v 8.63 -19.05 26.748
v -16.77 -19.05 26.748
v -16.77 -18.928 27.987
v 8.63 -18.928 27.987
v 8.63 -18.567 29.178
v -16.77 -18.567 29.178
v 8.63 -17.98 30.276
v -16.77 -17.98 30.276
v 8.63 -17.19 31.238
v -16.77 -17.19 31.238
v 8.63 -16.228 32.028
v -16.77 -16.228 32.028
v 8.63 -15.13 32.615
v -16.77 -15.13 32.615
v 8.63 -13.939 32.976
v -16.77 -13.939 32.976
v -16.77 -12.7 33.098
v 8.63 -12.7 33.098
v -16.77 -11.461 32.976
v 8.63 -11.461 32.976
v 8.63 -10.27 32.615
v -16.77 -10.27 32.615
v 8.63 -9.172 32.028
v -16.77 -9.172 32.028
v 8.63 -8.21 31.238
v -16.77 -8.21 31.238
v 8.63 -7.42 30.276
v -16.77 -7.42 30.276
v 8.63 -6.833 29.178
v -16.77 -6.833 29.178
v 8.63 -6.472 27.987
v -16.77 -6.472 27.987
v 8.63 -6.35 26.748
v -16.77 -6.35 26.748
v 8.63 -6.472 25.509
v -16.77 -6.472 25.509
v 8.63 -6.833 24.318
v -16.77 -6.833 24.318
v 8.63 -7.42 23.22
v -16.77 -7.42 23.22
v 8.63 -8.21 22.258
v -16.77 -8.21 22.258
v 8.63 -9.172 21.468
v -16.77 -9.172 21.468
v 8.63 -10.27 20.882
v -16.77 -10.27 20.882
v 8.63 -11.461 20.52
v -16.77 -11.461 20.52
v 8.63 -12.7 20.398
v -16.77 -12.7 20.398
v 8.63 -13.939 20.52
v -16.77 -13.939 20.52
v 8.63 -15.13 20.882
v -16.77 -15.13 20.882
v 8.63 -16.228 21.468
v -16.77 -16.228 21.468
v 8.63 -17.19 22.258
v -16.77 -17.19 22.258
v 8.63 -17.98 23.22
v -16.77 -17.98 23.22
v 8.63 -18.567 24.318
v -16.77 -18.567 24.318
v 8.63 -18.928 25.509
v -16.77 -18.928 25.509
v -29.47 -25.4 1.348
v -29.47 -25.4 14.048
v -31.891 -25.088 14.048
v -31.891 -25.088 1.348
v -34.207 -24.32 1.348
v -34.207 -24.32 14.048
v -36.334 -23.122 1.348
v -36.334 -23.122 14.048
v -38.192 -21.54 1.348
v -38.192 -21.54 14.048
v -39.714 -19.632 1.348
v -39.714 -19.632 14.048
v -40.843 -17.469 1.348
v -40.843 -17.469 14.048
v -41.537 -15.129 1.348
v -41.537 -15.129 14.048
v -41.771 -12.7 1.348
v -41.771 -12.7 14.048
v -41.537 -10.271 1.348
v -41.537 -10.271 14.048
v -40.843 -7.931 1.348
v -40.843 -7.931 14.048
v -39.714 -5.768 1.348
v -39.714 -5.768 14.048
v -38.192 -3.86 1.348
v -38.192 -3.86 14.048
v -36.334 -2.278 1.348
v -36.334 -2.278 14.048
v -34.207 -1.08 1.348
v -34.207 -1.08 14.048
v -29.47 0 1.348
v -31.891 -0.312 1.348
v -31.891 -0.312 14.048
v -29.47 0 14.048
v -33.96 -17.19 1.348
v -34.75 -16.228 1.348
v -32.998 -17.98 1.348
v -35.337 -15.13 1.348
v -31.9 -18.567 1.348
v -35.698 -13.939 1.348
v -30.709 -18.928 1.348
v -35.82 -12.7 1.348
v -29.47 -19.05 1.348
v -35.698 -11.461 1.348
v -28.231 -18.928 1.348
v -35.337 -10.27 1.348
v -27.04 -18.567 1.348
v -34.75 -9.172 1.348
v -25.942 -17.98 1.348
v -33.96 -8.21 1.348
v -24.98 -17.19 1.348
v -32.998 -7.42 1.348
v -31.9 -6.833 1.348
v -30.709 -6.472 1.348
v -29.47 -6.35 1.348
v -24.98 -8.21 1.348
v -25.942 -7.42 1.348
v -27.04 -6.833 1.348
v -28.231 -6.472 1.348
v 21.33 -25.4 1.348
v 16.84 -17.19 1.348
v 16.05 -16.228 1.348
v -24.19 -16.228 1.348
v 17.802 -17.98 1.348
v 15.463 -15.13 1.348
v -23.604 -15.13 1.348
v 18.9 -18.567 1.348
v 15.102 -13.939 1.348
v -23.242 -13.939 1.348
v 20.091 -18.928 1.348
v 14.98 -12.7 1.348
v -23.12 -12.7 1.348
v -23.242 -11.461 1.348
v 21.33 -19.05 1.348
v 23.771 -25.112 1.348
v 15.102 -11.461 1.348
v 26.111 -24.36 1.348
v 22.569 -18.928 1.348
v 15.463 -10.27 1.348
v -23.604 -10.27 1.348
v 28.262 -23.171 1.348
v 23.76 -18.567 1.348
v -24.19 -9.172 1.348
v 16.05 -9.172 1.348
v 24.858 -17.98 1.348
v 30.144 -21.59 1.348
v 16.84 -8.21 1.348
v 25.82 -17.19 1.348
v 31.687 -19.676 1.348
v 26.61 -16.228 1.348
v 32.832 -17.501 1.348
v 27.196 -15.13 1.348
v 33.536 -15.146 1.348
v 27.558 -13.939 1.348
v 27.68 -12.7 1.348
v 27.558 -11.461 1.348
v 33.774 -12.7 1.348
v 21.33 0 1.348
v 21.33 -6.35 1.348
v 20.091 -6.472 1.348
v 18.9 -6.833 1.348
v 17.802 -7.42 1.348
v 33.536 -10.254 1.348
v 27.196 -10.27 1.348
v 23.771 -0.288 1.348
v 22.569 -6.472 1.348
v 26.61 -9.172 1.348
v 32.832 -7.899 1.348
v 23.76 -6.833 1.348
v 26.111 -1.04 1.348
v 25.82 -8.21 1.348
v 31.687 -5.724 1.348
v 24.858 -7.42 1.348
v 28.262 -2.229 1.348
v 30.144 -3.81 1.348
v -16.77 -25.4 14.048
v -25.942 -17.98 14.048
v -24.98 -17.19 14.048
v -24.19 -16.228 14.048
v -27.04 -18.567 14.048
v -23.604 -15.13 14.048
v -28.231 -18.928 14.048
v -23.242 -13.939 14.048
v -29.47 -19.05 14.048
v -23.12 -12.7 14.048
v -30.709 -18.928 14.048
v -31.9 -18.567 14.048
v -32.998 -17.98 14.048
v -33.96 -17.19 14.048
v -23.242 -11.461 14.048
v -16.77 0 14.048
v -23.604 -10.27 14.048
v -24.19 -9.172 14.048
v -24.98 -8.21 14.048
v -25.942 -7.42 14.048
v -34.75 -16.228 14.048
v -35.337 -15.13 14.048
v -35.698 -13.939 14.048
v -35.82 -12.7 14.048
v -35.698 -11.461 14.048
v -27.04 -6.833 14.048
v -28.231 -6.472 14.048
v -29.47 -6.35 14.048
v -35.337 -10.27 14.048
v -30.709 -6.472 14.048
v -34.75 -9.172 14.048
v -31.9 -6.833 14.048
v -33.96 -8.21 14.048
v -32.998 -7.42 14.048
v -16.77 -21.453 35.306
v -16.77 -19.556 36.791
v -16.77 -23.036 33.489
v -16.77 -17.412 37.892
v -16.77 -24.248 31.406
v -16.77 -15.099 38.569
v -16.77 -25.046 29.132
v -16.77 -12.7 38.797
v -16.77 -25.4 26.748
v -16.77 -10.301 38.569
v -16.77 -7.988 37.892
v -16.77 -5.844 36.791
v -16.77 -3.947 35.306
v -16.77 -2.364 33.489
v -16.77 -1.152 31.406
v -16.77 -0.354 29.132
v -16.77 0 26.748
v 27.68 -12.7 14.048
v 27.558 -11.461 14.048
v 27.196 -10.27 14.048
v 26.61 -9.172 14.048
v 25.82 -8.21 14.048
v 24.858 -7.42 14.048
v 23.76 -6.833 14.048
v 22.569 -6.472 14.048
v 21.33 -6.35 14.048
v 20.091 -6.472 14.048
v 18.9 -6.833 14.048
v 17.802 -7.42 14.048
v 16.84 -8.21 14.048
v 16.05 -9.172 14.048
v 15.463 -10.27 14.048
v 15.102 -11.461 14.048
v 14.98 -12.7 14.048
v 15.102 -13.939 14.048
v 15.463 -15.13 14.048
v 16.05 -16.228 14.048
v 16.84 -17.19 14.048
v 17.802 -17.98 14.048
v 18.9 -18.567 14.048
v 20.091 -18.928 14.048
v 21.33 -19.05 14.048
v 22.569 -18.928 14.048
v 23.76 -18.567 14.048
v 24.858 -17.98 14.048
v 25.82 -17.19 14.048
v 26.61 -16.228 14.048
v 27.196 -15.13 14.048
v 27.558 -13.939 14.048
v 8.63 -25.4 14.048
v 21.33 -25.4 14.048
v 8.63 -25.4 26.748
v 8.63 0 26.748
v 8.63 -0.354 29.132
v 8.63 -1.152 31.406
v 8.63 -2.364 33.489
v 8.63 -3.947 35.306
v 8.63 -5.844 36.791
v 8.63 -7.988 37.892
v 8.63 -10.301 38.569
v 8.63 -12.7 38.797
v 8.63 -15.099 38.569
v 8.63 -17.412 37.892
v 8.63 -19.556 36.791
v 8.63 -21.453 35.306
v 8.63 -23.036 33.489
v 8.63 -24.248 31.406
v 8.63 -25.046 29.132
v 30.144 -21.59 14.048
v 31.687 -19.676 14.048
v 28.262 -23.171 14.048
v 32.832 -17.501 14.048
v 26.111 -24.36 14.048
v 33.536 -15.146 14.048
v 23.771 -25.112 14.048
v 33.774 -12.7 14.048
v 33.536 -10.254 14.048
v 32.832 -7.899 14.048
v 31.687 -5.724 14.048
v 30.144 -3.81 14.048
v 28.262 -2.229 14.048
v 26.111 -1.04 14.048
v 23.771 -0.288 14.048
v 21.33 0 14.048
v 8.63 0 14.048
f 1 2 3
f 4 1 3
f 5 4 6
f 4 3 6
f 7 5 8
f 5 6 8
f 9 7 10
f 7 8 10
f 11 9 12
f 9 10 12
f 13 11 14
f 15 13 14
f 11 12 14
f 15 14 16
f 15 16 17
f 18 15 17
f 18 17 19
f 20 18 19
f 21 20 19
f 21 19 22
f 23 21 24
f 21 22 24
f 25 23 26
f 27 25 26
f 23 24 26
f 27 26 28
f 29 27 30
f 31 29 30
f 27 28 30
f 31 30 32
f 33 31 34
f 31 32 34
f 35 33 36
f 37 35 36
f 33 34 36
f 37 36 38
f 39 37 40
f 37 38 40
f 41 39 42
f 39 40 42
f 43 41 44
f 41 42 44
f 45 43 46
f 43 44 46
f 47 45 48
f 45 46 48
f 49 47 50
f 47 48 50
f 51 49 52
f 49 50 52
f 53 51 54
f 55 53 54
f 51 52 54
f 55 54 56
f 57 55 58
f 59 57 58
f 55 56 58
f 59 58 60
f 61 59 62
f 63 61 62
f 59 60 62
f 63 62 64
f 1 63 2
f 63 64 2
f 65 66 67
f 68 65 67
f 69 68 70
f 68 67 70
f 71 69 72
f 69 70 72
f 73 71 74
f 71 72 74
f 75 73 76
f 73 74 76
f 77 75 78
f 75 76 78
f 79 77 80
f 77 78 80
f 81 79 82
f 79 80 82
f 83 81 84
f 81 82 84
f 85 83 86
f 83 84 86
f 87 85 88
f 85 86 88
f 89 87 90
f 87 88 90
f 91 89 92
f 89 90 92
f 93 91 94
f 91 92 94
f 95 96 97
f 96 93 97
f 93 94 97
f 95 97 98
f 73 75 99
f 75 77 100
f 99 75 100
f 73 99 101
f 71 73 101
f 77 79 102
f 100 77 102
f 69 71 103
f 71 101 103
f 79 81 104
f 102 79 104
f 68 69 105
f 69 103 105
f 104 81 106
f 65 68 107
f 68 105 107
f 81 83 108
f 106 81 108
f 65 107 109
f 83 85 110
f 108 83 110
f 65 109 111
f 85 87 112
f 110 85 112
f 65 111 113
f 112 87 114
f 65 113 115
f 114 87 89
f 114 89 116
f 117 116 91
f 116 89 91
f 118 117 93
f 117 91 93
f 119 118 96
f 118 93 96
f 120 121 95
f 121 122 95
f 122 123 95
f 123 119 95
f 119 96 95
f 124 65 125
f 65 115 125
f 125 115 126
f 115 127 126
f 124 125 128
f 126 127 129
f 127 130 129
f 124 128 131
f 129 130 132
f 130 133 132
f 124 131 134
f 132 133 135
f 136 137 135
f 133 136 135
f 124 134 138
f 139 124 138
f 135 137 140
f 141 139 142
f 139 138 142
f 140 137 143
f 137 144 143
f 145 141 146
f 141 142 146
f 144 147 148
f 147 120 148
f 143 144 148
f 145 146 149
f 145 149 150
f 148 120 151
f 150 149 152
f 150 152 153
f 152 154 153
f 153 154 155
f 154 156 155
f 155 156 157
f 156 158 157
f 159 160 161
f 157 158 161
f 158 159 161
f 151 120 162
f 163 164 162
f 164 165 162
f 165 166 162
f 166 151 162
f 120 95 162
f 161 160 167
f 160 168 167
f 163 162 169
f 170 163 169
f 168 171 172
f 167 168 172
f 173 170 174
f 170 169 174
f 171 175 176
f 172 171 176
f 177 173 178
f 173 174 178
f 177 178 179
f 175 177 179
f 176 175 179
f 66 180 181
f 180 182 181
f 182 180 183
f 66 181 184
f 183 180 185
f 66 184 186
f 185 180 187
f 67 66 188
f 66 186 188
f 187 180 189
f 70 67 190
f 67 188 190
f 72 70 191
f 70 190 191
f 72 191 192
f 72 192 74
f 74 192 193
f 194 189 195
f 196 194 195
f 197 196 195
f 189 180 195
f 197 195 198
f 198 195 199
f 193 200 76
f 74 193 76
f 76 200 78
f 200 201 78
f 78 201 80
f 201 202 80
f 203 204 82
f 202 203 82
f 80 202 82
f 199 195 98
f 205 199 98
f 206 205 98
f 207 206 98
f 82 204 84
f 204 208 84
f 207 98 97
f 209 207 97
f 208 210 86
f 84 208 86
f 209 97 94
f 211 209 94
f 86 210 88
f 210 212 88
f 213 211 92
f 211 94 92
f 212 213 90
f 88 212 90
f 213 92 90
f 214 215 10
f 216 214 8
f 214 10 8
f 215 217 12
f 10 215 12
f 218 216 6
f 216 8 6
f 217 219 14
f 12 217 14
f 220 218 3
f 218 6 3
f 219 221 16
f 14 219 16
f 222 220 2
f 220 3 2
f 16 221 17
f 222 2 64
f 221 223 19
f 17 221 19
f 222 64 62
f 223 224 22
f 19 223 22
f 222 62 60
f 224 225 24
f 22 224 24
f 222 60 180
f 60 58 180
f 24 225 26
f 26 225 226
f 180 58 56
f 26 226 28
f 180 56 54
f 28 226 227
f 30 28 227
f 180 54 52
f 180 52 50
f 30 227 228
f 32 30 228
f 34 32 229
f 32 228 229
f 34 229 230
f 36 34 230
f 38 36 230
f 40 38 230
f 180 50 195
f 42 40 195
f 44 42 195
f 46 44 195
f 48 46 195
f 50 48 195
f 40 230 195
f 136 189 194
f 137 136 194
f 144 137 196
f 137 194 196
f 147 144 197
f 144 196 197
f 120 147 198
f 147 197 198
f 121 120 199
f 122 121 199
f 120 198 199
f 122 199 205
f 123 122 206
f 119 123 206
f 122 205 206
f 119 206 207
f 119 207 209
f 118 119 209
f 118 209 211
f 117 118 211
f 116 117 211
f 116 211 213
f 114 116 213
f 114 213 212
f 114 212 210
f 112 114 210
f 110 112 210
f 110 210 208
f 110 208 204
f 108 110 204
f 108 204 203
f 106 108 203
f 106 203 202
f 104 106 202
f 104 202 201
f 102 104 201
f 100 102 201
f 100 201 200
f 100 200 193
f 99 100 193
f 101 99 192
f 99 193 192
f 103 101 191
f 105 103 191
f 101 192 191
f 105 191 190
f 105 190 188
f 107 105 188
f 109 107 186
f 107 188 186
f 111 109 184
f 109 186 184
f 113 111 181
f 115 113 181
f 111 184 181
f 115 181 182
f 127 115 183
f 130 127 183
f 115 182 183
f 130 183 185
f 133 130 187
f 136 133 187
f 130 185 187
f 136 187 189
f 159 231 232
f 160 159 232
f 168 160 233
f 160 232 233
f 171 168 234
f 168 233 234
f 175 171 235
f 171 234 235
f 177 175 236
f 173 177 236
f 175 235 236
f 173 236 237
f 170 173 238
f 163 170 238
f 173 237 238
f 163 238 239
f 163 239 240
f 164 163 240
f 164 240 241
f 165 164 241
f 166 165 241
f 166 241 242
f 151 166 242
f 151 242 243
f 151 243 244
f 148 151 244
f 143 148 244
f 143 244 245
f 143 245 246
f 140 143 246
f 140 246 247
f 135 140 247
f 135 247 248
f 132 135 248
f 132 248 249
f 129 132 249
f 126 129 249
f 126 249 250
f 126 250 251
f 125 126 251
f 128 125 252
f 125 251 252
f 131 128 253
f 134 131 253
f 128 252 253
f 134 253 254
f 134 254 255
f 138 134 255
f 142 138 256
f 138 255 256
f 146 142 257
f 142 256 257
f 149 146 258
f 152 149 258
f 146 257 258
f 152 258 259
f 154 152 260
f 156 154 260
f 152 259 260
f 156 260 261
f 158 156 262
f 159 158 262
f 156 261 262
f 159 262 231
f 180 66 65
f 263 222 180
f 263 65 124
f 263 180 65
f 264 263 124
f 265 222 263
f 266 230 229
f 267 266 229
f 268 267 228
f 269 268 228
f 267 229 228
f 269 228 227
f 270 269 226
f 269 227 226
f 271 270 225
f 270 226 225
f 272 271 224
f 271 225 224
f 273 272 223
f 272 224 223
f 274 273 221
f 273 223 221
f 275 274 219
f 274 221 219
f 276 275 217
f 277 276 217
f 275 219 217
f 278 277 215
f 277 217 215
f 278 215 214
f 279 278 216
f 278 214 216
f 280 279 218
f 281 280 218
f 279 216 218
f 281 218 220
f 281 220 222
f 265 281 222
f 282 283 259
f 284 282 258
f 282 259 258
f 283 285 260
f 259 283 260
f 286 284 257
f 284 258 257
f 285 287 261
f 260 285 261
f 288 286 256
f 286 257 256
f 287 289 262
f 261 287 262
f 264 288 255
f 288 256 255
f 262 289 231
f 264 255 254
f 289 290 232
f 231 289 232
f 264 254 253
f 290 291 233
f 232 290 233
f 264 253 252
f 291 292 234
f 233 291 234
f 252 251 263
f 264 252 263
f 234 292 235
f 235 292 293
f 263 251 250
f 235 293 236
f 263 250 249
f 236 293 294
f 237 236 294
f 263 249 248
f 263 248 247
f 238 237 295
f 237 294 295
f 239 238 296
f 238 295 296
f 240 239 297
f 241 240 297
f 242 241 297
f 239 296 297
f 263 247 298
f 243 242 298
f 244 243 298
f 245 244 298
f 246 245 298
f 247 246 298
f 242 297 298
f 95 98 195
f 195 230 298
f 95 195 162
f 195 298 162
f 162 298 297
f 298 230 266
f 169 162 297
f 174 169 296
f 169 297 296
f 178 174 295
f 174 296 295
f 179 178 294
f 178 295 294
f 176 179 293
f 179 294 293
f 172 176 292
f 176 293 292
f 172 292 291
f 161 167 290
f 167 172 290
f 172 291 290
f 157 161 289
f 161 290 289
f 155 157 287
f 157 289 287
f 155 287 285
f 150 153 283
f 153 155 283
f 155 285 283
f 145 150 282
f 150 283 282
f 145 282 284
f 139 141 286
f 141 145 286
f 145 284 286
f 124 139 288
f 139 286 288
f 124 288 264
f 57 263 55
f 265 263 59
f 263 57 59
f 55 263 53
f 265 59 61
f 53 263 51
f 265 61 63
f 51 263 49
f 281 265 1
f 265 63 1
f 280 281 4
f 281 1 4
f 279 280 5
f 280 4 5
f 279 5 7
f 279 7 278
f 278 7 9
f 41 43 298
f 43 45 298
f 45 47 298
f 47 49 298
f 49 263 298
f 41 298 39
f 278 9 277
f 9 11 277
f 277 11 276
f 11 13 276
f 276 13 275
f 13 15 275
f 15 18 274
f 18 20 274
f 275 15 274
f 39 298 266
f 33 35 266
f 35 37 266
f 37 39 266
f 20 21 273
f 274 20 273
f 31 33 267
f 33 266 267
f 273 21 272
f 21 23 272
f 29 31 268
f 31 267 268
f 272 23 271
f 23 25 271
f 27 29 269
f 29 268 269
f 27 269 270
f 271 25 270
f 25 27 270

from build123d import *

# Parameters (mm, degrees)
F1_DEPTH = 25.4
F2_R     = 6.35
F3_DEPTH = 25.4
F4_R     = 6.35
F5_DEPTH = 25.4
F6_R     = 6.35
F7_DEPTH = 25.4


with BuildPart() as f1:
    # F0 (on Front) → F1 (new body)
    with BuildSketch(Plane.XZ):
        Polygon((-16.770223, 14.04828), (-42.170223, 14.04828), (-42.170223, 1.34828), (34.029777, 1.34828), (34.029777, 14.04828), (8.629777, 14.04828), (8.629777, 39.44828), (-16.770223, 39.44828), align=None)
    extrude(amount=F1_DEPTH)

    # F2 (on face) → F3 (cut)
    with BuildSketch(Plane(origin=(-16.770223, 0, 0), x_dir=(0, -1, 0), z_dir=(-1, 0, 0))):
        with Locations((12.7, 26.74828)):
            Circle(F2_R)
        with BuildLine():
            ThreePointArc((0, 26.74828), (12.7, 38.797286), (25.4, 26.74828))
            Line((25.4, 26.74828), (25.4, 39.44828))
            Line((25.4, 39.44828), (0, 39.44828))
            Line((0, 39.44828), (0, 26.74828))
        make_face()
    extrude(amount=-F3_DEPTH, mode=Mode.SUBTRACT)

    # F4 (on face) → F5 (cut)
    with BuildSketch(Plane.XY.offset(14.04828)):
        with Locations((-29.470223, -12.7)):
            Circle(F4_R)
        with BuildLine():
            ThreePointArc((-29.470223, -25.4), (-41.771417, -12.7), (-29.470223, 0))
            Line((-29.470223, 0), (-42.170223, 0))
            Line((-42.170223, 0), (-42.170223, -25.4))
            Line((-42.170223, -25.4), (-29.470223, -25.4))
        make_face()
    extrude(amount=-F5_DEPTH, mode=Mode.SUBTRACT)

    # F6 (on face) → F7 (cut)
    with BuildSketch(Plane.XY.offset(14.04828)):
        with Locations((21.329777, -12.7)):
            Circle(F6_R)
        with BuildLine():
            ThreePointArc((21.329777, 0), (33.774057, -12.7), (21.329777, -25.4))
            Line((21.329777, -25.4), (34.029777, -25.4))
            Line((34.029777, -25.4), (34.029777, 0))
            Line((34.029777, 0), (21.329777, 0))
        make_face()
    extrude(amount=-F7_DEPTH, mode=Mode.SUBTRACT)


solid = f1.part
